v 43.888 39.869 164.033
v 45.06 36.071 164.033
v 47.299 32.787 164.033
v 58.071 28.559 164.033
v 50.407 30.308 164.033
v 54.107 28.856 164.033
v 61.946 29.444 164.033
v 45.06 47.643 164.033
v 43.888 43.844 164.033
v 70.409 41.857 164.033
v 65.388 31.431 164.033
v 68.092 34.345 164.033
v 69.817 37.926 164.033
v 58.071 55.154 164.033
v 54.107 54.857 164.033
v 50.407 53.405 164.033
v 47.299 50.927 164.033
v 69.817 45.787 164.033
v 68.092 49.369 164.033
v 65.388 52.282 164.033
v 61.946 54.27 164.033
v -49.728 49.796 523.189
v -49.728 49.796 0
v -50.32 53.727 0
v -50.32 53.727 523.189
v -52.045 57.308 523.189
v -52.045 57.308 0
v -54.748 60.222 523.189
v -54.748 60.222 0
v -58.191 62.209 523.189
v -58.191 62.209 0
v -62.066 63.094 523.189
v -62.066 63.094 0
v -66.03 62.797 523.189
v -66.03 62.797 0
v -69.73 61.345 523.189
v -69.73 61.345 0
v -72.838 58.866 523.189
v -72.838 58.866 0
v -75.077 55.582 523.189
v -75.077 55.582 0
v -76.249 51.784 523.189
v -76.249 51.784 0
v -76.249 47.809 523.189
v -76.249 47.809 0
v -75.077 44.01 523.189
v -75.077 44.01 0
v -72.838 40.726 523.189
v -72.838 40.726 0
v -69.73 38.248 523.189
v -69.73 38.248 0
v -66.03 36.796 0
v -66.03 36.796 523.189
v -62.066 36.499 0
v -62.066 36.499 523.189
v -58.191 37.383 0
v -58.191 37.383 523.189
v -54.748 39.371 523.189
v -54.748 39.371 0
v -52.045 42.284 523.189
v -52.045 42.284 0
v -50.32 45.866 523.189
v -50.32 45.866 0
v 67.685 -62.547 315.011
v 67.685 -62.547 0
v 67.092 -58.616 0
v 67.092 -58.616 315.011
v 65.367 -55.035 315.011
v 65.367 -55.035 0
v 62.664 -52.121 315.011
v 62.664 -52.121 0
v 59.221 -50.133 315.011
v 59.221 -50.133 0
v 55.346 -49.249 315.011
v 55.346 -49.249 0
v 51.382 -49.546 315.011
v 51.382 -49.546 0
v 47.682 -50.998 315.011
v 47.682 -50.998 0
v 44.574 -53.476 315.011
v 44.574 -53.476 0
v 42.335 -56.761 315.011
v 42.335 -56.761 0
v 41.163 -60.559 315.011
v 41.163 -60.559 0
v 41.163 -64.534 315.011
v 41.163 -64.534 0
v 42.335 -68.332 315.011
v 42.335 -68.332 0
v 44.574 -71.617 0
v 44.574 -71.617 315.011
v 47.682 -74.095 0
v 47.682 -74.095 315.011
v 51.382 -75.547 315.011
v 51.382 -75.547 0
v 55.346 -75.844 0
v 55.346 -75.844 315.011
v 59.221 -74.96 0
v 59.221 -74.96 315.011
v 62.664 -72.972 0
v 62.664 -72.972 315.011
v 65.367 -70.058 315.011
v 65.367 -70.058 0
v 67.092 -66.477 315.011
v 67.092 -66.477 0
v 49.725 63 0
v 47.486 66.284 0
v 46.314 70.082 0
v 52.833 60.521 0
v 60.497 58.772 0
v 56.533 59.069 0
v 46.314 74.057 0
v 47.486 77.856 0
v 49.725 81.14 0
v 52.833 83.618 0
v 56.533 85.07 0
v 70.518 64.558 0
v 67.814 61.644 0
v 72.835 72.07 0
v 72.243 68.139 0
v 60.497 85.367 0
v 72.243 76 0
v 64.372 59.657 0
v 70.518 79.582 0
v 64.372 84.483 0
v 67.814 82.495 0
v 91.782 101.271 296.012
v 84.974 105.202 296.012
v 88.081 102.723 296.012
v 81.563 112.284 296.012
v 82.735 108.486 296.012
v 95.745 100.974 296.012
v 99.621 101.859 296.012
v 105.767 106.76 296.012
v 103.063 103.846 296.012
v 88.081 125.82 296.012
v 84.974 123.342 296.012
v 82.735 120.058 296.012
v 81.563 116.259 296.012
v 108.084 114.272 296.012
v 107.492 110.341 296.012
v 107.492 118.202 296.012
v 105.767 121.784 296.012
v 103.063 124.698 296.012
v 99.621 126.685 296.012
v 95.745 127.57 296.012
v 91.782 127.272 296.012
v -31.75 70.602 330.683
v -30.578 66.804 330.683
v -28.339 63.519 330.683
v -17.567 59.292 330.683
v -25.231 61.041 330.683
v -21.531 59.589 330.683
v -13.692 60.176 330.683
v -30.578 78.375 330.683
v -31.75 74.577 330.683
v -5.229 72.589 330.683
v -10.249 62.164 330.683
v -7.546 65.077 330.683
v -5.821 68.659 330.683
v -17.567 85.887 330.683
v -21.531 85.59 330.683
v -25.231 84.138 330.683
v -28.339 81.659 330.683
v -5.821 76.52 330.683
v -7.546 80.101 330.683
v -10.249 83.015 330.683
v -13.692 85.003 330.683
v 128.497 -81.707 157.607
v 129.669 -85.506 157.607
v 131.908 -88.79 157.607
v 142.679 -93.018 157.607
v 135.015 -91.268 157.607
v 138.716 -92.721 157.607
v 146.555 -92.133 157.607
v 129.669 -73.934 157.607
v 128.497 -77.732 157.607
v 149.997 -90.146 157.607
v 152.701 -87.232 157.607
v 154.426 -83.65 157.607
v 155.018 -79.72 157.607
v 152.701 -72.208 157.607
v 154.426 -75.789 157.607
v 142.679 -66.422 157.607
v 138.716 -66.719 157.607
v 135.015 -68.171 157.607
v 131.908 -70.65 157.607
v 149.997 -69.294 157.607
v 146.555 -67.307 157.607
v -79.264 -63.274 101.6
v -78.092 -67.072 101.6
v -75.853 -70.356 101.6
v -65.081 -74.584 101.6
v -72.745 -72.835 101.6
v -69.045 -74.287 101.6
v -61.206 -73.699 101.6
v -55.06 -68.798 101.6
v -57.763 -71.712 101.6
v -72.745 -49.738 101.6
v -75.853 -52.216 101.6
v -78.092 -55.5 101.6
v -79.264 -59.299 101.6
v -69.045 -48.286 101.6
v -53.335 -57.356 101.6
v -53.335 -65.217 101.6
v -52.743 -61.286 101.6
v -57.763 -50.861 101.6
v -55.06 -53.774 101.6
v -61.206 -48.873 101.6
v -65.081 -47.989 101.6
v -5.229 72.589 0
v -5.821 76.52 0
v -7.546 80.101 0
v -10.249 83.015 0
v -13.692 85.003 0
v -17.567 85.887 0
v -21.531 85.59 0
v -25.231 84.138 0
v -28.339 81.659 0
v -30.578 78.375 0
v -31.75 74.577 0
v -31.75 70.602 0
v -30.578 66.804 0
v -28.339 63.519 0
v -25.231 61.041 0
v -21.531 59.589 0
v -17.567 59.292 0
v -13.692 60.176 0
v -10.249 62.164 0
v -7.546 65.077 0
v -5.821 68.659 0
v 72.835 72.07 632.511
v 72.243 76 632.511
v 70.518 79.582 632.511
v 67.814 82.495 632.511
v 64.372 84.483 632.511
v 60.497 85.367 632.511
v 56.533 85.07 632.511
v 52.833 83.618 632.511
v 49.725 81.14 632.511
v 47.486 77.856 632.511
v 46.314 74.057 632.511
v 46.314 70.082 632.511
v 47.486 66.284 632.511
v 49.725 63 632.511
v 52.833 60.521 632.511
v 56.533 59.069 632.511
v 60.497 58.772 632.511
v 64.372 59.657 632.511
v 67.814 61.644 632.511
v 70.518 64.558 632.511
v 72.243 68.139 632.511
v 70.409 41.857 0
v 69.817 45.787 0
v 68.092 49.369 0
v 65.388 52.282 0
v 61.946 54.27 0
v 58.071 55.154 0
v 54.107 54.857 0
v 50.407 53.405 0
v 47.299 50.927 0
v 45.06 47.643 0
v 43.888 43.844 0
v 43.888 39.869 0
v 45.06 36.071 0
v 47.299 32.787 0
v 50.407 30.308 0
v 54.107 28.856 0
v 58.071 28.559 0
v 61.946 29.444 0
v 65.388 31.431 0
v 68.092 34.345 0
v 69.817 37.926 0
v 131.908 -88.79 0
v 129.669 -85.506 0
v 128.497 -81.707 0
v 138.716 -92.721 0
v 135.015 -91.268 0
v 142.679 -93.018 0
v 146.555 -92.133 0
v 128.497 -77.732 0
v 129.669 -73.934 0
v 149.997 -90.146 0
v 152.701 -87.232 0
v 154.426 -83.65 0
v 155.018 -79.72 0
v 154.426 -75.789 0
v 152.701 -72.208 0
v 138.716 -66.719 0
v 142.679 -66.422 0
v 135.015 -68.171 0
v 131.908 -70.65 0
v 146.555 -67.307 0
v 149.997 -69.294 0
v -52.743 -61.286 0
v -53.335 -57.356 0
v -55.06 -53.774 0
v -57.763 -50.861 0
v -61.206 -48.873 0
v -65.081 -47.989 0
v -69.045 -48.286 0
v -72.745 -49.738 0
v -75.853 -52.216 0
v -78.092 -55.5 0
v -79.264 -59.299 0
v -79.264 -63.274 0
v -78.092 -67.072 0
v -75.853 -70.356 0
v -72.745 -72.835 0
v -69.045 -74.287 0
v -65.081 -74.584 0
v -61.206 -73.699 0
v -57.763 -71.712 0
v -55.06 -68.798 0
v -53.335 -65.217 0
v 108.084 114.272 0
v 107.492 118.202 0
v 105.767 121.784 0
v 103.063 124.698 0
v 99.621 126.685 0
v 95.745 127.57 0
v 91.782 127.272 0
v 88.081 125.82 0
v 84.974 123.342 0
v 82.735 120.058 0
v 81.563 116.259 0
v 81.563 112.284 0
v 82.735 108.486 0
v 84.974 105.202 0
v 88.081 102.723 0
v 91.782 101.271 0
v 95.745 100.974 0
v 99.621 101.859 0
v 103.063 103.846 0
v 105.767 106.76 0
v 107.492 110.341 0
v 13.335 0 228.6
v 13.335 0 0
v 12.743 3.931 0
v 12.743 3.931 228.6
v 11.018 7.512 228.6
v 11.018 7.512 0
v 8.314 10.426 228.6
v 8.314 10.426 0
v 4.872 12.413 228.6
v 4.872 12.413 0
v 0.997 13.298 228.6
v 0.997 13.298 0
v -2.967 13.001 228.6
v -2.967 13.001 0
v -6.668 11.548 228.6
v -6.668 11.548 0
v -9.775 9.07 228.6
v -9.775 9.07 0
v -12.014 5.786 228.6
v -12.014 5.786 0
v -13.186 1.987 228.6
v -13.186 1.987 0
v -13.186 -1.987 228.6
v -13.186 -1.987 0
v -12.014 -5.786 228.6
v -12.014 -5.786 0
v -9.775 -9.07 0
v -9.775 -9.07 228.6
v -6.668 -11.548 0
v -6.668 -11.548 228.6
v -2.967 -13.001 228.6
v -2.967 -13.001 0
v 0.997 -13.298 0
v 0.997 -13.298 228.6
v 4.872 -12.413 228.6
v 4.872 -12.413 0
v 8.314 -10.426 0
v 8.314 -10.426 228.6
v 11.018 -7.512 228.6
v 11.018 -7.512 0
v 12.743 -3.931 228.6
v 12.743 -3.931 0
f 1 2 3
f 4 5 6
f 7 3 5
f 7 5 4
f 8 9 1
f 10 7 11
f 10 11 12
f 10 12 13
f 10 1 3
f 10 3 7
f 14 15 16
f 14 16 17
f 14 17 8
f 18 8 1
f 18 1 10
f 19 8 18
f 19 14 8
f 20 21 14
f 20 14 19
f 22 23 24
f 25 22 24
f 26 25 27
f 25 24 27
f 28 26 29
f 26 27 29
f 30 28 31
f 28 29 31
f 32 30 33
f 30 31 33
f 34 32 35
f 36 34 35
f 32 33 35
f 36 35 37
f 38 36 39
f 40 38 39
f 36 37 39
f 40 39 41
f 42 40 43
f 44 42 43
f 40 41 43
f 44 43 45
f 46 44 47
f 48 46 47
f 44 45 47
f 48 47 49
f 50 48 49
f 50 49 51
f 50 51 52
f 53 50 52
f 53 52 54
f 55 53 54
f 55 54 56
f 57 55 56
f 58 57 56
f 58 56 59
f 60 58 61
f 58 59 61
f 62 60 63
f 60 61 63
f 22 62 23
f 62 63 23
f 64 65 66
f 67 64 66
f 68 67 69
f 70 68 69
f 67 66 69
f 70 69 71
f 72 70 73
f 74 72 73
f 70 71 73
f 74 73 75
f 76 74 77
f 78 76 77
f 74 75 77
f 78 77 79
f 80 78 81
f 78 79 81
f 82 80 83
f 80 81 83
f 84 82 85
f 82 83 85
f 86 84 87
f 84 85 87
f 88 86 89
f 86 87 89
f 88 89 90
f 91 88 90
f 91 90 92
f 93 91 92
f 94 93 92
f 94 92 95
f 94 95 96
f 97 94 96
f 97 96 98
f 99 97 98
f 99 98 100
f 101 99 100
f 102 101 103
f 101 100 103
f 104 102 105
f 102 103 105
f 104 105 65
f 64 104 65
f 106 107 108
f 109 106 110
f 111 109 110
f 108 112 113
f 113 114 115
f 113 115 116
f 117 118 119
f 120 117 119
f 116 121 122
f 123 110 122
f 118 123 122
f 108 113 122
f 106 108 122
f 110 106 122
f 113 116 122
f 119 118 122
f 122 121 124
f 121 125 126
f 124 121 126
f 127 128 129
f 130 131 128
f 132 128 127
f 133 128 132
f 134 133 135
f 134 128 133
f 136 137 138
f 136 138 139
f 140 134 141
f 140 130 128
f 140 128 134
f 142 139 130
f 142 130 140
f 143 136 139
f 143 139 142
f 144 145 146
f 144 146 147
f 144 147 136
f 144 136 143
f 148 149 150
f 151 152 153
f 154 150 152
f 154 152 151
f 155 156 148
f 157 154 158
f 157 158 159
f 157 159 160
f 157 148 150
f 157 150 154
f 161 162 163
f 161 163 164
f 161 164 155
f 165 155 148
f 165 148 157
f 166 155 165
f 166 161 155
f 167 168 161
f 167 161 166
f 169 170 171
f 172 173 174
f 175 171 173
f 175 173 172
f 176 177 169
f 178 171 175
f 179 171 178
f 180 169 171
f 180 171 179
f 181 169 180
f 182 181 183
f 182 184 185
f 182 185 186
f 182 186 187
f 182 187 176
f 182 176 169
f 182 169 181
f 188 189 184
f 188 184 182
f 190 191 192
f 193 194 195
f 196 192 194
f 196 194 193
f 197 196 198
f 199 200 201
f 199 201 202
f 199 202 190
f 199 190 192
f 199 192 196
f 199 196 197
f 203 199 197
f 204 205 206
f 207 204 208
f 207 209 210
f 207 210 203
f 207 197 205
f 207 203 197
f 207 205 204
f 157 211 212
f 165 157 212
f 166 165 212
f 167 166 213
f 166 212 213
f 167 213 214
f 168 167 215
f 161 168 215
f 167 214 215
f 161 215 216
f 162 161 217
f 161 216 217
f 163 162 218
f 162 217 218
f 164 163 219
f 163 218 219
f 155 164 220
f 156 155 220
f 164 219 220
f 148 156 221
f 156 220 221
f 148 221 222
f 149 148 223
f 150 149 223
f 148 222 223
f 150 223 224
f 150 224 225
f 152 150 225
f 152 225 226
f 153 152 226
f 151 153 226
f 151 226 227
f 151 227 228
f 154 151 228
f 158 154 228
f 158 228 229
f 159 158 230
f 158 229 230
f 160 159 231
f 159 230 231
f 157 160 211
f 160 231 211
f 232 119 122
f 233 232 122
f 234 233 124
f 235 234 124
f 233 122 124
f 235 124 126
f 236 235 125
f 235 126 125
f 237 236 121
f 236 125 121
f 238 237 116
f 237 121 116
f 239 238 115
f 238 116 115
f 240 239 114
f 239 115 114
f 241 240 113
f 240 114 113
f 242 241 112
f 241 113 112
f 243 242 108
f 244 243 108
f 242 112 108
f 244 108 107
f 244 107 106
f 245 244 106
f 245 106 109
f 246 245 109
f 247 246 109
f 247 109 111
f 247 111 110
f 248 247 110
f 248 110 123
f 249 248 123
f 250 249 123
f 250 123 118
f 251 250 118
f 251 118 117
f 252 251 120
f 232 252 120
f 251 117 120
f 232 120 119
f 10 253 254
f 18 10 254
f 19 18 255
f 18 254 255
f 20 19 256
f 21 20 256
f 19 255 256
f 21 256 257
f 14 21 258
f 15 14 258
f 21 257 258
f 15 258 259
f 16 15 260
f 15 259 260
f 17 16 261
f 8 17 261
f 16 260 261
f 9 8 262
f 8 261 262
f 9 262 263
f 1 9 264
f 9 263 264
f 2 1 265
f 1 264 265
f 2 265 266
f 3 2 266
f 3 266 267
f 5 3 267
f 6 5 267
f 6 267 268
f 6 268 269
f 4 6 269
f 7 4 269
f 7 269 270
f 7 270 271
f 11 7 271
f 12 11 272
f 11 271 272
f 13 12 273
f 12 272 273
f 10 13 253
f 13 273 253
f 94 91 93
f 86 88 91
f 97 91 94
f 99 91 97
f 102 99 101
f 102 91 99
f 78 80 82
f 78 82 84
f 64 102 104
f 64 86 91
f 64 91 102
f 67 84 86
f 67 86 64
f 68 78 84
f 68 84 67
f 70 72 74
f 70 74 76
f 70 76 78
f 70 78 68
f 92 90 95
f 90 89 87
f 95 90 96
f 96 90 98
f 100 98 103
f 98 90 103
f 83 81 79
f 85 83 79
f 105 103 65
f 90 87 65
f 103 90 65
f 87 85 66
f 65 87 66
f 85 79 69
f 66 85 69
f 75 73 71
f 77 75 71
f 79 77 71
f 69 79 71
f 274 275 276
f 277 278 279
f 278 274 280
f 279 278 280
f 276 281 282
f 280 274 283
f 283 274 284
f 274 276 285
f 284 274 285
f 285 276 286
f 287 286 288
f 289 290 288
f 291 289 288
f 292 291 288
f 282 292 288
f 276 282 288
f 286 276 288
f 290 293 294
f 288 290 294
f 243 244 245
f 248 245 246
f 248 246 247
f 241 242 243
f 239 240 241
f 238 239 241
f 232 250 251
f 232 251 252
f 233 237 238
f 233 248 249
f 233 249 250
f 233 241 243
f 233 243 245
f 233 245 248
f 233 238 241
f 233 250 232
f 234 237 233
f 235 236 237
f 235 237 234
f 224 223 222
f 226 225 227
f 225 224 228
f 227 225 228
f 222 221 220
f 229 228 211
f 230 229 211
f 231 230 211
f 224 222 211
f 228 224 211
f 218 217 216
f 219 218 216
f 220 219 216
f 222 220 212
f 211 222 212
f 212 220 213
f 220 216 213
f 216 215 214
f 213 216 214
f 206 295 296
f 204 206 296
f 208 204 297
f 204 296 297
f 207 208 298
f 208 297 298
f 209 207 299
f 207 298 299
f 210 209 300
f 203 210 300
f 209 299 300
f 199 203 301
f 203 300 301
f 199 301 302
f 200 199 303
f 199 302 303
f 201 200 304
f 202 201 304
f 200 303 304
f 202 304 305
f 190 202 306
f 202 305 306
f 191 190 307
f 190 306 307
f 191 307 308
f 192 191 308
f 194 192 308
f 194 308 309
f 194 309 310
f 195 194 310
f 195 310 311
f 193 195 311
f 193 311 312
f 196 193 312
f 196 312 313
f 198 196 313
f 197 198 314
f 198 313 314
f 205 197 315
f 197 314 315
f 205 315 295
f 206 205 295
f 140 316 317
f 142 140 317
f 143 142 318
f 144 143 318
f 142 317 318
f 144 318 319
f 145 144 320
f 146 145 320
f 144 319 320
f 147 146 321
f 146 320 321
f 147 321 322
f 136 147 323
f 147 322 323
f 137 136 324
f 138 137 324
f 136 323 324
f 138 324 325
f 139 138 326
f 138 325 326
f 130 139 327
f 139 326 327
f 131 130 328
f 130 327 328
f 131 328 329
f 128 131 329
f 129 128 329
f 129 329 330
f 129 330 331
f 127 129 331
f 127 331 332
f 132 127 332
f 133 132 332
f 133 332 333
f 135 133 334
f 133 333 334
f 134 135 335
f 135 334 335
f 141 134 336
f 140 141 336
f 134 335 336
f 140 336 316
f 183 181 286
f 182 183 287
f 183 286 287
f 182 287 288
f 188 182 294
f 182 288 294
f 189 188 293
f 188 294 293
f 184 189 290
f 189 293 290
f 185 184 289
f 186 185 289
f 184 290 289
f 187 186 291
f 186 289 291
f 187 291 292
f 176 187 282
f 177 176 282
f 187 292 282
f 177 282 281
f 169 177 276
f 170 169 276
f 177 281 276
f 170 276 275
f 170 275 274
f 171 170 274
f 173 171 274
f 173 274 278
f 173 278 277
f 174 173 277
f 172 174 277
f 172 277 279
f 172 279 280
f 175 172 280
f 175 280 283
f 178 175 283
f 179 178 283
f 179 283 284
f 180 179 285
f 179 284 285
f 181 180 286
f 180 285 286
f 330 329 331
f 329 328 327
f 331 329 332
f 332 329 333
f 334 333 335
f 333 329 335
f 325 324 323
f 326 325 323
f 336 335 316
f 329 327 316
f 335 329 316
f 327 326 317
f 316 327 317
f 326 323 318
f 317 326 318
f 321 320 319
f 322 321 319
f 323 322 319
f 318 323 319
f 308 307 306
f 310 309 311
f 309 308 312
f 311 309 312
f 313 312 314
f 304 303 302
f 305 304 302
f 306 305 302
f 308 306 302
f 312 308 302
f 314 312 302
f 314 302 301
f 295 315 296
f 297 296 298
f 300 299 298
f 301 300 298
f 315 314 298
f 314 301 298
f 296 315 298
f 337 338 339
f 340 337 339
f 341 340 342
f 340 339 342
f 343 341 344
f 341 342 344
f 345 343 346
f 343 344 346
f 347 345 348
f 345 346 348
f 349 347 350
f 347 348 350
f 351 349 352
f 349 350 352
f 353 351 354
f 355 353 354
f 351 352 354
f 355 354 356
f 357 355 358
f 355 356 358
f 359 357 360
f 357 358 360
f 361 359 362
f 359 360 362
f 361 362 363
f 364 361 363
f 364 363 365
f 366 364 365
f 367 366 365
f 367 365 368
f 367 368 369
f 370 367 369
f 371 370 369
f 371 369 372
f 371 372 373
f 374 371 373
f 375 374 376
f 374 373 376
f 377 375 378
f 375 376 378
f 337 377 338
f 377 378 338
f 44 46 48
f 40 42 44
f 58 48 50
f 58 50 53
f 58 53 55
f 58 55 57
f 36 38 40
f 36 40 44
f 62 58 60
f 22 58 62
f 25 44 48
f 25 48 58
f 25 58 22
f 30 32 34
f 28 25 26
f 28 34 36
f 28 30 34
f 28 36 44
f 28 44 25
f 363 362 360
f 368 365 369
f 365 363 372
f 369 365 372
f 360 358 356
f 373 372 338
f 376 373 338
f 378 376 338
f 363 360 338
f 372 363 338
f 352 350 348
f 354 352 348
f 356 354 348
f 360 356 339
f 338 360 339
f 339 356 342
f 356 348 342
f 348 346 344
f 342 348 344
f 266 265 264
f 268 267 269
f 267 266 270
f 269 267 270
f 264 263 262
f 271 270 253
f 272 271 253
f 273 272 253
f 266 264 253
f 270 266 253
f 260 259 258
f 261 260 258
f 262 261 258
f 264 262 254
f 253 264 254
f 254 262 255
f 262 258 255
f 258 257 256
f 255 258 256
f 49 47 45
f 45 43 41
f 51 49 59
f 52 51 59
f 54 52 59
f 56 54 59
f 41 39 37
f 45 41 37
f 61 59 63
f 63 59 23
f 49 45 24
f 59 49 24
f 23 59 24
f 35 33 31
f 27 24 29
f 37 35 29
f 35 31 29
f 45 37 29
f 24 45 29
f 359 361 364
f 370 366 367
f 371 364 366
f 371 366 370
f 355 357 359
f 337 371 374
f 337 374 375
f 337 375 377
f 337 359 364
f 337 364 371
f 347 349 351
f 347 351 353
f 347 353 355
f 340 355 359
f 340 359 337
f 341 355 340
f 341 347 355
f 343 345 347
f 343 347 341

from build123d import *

# Parameters (mm, degrees)
F0_R      = 13.335
F1_DEPTH  = 228.6
F2_R      = 13.335
F3_DEPTH  = 101.6
F4_R      = 13.335
F5_DEPTH  = 315.0108
F6_R      = 13.335
F7_DEPTH  = 523.1892
F8_R      = 13.335
F9_DEPTH  = 164.0332
F10_R     = 13.335
F11_DEPTH = 296.0116
F12_R     = 13.335
F13_DEPTH = 632.5108
F14_R     = 13.335
F15_DEPTH = 330.6826
F16_R     = 13.335
F17_DEPTH = 157.607


with BuildPart() as f1:
    # F0 (on Top) → F1 (new body)
    with BuildSketch(Plane.XY):
        Circle(F0_R)
    extrude(amount=F1_DEPTH)


with BuildPart() as f3:
    # F2 (on Top) → F3 (new body)
    with BuildSketch(Plane.XY):
        with Locations((-66.077583, -61.286233)):
            Circle(F2_R)
    extrude(amount=F3_DEPTH)


with BuildPart() as f5:
    # F4 (on Top) → F5 (new body)
    with BuildSketch(Plane.XY):
        with Locations((54.349527, -62.546603)):
            Circle(F4_R)
    extrude(amount=F5_DEPTH)


with BuildPart() as f7:
    # F6 (on Top) → F7 (new body)
    with BuildSketch(Plane.XY):
        with Locations((-63.06272, 49.796227)):
            Circle(F6_R)
    extrude(amount=F7_DEPTH)


with BuildPart() as f9:
    # F8 (on Top) → F9 (new body)
    with BuildSketch(Plane.XY):
        with Locations((57.074126, 41.856747)):
            Circle(F8_R)
    extrude(amount=F9_DEPTH)


with BuildPart() as f11:
    # F10 (on Top) → F11 (new body)
    with BuildSketch(Plane.XY):
        with Locations((94.748959, 114.27179)):
            Circle(F10_R)
    extrude(amount=F11_DEPTH)


with BuildPart() as f13:
    # F12 (on Top) → F13 (new body)
    with BuildSketch(Plane.XY):
        with Locations((59.500091, 72.069749)):
            Circle(F12_R)
    extrude(amount=F13_DEPTH)


with BuildPart() as f15:
    # F14 (on Top) → F15 (new body)
    with BuildSketch(Plane.XY):
        with Locations((-18.563656, 72.589368)):
            Circle(F14_R)
    extrude(amount=F15_DEPTH)


with BuildPart() as f17:
    # F16 (on Top) → F17 (new body)
    with BuildSketch(Plane.XY):
        with Locations((141.682953, -79.719841)):
            Circle(F16_R)
    extrude(amount=F17_DEPTH)


solid = Compound([f1.part, f3.part, f5.part, f7.part, f9.part, f11.part, f13.part, f15.part, f17.part])
